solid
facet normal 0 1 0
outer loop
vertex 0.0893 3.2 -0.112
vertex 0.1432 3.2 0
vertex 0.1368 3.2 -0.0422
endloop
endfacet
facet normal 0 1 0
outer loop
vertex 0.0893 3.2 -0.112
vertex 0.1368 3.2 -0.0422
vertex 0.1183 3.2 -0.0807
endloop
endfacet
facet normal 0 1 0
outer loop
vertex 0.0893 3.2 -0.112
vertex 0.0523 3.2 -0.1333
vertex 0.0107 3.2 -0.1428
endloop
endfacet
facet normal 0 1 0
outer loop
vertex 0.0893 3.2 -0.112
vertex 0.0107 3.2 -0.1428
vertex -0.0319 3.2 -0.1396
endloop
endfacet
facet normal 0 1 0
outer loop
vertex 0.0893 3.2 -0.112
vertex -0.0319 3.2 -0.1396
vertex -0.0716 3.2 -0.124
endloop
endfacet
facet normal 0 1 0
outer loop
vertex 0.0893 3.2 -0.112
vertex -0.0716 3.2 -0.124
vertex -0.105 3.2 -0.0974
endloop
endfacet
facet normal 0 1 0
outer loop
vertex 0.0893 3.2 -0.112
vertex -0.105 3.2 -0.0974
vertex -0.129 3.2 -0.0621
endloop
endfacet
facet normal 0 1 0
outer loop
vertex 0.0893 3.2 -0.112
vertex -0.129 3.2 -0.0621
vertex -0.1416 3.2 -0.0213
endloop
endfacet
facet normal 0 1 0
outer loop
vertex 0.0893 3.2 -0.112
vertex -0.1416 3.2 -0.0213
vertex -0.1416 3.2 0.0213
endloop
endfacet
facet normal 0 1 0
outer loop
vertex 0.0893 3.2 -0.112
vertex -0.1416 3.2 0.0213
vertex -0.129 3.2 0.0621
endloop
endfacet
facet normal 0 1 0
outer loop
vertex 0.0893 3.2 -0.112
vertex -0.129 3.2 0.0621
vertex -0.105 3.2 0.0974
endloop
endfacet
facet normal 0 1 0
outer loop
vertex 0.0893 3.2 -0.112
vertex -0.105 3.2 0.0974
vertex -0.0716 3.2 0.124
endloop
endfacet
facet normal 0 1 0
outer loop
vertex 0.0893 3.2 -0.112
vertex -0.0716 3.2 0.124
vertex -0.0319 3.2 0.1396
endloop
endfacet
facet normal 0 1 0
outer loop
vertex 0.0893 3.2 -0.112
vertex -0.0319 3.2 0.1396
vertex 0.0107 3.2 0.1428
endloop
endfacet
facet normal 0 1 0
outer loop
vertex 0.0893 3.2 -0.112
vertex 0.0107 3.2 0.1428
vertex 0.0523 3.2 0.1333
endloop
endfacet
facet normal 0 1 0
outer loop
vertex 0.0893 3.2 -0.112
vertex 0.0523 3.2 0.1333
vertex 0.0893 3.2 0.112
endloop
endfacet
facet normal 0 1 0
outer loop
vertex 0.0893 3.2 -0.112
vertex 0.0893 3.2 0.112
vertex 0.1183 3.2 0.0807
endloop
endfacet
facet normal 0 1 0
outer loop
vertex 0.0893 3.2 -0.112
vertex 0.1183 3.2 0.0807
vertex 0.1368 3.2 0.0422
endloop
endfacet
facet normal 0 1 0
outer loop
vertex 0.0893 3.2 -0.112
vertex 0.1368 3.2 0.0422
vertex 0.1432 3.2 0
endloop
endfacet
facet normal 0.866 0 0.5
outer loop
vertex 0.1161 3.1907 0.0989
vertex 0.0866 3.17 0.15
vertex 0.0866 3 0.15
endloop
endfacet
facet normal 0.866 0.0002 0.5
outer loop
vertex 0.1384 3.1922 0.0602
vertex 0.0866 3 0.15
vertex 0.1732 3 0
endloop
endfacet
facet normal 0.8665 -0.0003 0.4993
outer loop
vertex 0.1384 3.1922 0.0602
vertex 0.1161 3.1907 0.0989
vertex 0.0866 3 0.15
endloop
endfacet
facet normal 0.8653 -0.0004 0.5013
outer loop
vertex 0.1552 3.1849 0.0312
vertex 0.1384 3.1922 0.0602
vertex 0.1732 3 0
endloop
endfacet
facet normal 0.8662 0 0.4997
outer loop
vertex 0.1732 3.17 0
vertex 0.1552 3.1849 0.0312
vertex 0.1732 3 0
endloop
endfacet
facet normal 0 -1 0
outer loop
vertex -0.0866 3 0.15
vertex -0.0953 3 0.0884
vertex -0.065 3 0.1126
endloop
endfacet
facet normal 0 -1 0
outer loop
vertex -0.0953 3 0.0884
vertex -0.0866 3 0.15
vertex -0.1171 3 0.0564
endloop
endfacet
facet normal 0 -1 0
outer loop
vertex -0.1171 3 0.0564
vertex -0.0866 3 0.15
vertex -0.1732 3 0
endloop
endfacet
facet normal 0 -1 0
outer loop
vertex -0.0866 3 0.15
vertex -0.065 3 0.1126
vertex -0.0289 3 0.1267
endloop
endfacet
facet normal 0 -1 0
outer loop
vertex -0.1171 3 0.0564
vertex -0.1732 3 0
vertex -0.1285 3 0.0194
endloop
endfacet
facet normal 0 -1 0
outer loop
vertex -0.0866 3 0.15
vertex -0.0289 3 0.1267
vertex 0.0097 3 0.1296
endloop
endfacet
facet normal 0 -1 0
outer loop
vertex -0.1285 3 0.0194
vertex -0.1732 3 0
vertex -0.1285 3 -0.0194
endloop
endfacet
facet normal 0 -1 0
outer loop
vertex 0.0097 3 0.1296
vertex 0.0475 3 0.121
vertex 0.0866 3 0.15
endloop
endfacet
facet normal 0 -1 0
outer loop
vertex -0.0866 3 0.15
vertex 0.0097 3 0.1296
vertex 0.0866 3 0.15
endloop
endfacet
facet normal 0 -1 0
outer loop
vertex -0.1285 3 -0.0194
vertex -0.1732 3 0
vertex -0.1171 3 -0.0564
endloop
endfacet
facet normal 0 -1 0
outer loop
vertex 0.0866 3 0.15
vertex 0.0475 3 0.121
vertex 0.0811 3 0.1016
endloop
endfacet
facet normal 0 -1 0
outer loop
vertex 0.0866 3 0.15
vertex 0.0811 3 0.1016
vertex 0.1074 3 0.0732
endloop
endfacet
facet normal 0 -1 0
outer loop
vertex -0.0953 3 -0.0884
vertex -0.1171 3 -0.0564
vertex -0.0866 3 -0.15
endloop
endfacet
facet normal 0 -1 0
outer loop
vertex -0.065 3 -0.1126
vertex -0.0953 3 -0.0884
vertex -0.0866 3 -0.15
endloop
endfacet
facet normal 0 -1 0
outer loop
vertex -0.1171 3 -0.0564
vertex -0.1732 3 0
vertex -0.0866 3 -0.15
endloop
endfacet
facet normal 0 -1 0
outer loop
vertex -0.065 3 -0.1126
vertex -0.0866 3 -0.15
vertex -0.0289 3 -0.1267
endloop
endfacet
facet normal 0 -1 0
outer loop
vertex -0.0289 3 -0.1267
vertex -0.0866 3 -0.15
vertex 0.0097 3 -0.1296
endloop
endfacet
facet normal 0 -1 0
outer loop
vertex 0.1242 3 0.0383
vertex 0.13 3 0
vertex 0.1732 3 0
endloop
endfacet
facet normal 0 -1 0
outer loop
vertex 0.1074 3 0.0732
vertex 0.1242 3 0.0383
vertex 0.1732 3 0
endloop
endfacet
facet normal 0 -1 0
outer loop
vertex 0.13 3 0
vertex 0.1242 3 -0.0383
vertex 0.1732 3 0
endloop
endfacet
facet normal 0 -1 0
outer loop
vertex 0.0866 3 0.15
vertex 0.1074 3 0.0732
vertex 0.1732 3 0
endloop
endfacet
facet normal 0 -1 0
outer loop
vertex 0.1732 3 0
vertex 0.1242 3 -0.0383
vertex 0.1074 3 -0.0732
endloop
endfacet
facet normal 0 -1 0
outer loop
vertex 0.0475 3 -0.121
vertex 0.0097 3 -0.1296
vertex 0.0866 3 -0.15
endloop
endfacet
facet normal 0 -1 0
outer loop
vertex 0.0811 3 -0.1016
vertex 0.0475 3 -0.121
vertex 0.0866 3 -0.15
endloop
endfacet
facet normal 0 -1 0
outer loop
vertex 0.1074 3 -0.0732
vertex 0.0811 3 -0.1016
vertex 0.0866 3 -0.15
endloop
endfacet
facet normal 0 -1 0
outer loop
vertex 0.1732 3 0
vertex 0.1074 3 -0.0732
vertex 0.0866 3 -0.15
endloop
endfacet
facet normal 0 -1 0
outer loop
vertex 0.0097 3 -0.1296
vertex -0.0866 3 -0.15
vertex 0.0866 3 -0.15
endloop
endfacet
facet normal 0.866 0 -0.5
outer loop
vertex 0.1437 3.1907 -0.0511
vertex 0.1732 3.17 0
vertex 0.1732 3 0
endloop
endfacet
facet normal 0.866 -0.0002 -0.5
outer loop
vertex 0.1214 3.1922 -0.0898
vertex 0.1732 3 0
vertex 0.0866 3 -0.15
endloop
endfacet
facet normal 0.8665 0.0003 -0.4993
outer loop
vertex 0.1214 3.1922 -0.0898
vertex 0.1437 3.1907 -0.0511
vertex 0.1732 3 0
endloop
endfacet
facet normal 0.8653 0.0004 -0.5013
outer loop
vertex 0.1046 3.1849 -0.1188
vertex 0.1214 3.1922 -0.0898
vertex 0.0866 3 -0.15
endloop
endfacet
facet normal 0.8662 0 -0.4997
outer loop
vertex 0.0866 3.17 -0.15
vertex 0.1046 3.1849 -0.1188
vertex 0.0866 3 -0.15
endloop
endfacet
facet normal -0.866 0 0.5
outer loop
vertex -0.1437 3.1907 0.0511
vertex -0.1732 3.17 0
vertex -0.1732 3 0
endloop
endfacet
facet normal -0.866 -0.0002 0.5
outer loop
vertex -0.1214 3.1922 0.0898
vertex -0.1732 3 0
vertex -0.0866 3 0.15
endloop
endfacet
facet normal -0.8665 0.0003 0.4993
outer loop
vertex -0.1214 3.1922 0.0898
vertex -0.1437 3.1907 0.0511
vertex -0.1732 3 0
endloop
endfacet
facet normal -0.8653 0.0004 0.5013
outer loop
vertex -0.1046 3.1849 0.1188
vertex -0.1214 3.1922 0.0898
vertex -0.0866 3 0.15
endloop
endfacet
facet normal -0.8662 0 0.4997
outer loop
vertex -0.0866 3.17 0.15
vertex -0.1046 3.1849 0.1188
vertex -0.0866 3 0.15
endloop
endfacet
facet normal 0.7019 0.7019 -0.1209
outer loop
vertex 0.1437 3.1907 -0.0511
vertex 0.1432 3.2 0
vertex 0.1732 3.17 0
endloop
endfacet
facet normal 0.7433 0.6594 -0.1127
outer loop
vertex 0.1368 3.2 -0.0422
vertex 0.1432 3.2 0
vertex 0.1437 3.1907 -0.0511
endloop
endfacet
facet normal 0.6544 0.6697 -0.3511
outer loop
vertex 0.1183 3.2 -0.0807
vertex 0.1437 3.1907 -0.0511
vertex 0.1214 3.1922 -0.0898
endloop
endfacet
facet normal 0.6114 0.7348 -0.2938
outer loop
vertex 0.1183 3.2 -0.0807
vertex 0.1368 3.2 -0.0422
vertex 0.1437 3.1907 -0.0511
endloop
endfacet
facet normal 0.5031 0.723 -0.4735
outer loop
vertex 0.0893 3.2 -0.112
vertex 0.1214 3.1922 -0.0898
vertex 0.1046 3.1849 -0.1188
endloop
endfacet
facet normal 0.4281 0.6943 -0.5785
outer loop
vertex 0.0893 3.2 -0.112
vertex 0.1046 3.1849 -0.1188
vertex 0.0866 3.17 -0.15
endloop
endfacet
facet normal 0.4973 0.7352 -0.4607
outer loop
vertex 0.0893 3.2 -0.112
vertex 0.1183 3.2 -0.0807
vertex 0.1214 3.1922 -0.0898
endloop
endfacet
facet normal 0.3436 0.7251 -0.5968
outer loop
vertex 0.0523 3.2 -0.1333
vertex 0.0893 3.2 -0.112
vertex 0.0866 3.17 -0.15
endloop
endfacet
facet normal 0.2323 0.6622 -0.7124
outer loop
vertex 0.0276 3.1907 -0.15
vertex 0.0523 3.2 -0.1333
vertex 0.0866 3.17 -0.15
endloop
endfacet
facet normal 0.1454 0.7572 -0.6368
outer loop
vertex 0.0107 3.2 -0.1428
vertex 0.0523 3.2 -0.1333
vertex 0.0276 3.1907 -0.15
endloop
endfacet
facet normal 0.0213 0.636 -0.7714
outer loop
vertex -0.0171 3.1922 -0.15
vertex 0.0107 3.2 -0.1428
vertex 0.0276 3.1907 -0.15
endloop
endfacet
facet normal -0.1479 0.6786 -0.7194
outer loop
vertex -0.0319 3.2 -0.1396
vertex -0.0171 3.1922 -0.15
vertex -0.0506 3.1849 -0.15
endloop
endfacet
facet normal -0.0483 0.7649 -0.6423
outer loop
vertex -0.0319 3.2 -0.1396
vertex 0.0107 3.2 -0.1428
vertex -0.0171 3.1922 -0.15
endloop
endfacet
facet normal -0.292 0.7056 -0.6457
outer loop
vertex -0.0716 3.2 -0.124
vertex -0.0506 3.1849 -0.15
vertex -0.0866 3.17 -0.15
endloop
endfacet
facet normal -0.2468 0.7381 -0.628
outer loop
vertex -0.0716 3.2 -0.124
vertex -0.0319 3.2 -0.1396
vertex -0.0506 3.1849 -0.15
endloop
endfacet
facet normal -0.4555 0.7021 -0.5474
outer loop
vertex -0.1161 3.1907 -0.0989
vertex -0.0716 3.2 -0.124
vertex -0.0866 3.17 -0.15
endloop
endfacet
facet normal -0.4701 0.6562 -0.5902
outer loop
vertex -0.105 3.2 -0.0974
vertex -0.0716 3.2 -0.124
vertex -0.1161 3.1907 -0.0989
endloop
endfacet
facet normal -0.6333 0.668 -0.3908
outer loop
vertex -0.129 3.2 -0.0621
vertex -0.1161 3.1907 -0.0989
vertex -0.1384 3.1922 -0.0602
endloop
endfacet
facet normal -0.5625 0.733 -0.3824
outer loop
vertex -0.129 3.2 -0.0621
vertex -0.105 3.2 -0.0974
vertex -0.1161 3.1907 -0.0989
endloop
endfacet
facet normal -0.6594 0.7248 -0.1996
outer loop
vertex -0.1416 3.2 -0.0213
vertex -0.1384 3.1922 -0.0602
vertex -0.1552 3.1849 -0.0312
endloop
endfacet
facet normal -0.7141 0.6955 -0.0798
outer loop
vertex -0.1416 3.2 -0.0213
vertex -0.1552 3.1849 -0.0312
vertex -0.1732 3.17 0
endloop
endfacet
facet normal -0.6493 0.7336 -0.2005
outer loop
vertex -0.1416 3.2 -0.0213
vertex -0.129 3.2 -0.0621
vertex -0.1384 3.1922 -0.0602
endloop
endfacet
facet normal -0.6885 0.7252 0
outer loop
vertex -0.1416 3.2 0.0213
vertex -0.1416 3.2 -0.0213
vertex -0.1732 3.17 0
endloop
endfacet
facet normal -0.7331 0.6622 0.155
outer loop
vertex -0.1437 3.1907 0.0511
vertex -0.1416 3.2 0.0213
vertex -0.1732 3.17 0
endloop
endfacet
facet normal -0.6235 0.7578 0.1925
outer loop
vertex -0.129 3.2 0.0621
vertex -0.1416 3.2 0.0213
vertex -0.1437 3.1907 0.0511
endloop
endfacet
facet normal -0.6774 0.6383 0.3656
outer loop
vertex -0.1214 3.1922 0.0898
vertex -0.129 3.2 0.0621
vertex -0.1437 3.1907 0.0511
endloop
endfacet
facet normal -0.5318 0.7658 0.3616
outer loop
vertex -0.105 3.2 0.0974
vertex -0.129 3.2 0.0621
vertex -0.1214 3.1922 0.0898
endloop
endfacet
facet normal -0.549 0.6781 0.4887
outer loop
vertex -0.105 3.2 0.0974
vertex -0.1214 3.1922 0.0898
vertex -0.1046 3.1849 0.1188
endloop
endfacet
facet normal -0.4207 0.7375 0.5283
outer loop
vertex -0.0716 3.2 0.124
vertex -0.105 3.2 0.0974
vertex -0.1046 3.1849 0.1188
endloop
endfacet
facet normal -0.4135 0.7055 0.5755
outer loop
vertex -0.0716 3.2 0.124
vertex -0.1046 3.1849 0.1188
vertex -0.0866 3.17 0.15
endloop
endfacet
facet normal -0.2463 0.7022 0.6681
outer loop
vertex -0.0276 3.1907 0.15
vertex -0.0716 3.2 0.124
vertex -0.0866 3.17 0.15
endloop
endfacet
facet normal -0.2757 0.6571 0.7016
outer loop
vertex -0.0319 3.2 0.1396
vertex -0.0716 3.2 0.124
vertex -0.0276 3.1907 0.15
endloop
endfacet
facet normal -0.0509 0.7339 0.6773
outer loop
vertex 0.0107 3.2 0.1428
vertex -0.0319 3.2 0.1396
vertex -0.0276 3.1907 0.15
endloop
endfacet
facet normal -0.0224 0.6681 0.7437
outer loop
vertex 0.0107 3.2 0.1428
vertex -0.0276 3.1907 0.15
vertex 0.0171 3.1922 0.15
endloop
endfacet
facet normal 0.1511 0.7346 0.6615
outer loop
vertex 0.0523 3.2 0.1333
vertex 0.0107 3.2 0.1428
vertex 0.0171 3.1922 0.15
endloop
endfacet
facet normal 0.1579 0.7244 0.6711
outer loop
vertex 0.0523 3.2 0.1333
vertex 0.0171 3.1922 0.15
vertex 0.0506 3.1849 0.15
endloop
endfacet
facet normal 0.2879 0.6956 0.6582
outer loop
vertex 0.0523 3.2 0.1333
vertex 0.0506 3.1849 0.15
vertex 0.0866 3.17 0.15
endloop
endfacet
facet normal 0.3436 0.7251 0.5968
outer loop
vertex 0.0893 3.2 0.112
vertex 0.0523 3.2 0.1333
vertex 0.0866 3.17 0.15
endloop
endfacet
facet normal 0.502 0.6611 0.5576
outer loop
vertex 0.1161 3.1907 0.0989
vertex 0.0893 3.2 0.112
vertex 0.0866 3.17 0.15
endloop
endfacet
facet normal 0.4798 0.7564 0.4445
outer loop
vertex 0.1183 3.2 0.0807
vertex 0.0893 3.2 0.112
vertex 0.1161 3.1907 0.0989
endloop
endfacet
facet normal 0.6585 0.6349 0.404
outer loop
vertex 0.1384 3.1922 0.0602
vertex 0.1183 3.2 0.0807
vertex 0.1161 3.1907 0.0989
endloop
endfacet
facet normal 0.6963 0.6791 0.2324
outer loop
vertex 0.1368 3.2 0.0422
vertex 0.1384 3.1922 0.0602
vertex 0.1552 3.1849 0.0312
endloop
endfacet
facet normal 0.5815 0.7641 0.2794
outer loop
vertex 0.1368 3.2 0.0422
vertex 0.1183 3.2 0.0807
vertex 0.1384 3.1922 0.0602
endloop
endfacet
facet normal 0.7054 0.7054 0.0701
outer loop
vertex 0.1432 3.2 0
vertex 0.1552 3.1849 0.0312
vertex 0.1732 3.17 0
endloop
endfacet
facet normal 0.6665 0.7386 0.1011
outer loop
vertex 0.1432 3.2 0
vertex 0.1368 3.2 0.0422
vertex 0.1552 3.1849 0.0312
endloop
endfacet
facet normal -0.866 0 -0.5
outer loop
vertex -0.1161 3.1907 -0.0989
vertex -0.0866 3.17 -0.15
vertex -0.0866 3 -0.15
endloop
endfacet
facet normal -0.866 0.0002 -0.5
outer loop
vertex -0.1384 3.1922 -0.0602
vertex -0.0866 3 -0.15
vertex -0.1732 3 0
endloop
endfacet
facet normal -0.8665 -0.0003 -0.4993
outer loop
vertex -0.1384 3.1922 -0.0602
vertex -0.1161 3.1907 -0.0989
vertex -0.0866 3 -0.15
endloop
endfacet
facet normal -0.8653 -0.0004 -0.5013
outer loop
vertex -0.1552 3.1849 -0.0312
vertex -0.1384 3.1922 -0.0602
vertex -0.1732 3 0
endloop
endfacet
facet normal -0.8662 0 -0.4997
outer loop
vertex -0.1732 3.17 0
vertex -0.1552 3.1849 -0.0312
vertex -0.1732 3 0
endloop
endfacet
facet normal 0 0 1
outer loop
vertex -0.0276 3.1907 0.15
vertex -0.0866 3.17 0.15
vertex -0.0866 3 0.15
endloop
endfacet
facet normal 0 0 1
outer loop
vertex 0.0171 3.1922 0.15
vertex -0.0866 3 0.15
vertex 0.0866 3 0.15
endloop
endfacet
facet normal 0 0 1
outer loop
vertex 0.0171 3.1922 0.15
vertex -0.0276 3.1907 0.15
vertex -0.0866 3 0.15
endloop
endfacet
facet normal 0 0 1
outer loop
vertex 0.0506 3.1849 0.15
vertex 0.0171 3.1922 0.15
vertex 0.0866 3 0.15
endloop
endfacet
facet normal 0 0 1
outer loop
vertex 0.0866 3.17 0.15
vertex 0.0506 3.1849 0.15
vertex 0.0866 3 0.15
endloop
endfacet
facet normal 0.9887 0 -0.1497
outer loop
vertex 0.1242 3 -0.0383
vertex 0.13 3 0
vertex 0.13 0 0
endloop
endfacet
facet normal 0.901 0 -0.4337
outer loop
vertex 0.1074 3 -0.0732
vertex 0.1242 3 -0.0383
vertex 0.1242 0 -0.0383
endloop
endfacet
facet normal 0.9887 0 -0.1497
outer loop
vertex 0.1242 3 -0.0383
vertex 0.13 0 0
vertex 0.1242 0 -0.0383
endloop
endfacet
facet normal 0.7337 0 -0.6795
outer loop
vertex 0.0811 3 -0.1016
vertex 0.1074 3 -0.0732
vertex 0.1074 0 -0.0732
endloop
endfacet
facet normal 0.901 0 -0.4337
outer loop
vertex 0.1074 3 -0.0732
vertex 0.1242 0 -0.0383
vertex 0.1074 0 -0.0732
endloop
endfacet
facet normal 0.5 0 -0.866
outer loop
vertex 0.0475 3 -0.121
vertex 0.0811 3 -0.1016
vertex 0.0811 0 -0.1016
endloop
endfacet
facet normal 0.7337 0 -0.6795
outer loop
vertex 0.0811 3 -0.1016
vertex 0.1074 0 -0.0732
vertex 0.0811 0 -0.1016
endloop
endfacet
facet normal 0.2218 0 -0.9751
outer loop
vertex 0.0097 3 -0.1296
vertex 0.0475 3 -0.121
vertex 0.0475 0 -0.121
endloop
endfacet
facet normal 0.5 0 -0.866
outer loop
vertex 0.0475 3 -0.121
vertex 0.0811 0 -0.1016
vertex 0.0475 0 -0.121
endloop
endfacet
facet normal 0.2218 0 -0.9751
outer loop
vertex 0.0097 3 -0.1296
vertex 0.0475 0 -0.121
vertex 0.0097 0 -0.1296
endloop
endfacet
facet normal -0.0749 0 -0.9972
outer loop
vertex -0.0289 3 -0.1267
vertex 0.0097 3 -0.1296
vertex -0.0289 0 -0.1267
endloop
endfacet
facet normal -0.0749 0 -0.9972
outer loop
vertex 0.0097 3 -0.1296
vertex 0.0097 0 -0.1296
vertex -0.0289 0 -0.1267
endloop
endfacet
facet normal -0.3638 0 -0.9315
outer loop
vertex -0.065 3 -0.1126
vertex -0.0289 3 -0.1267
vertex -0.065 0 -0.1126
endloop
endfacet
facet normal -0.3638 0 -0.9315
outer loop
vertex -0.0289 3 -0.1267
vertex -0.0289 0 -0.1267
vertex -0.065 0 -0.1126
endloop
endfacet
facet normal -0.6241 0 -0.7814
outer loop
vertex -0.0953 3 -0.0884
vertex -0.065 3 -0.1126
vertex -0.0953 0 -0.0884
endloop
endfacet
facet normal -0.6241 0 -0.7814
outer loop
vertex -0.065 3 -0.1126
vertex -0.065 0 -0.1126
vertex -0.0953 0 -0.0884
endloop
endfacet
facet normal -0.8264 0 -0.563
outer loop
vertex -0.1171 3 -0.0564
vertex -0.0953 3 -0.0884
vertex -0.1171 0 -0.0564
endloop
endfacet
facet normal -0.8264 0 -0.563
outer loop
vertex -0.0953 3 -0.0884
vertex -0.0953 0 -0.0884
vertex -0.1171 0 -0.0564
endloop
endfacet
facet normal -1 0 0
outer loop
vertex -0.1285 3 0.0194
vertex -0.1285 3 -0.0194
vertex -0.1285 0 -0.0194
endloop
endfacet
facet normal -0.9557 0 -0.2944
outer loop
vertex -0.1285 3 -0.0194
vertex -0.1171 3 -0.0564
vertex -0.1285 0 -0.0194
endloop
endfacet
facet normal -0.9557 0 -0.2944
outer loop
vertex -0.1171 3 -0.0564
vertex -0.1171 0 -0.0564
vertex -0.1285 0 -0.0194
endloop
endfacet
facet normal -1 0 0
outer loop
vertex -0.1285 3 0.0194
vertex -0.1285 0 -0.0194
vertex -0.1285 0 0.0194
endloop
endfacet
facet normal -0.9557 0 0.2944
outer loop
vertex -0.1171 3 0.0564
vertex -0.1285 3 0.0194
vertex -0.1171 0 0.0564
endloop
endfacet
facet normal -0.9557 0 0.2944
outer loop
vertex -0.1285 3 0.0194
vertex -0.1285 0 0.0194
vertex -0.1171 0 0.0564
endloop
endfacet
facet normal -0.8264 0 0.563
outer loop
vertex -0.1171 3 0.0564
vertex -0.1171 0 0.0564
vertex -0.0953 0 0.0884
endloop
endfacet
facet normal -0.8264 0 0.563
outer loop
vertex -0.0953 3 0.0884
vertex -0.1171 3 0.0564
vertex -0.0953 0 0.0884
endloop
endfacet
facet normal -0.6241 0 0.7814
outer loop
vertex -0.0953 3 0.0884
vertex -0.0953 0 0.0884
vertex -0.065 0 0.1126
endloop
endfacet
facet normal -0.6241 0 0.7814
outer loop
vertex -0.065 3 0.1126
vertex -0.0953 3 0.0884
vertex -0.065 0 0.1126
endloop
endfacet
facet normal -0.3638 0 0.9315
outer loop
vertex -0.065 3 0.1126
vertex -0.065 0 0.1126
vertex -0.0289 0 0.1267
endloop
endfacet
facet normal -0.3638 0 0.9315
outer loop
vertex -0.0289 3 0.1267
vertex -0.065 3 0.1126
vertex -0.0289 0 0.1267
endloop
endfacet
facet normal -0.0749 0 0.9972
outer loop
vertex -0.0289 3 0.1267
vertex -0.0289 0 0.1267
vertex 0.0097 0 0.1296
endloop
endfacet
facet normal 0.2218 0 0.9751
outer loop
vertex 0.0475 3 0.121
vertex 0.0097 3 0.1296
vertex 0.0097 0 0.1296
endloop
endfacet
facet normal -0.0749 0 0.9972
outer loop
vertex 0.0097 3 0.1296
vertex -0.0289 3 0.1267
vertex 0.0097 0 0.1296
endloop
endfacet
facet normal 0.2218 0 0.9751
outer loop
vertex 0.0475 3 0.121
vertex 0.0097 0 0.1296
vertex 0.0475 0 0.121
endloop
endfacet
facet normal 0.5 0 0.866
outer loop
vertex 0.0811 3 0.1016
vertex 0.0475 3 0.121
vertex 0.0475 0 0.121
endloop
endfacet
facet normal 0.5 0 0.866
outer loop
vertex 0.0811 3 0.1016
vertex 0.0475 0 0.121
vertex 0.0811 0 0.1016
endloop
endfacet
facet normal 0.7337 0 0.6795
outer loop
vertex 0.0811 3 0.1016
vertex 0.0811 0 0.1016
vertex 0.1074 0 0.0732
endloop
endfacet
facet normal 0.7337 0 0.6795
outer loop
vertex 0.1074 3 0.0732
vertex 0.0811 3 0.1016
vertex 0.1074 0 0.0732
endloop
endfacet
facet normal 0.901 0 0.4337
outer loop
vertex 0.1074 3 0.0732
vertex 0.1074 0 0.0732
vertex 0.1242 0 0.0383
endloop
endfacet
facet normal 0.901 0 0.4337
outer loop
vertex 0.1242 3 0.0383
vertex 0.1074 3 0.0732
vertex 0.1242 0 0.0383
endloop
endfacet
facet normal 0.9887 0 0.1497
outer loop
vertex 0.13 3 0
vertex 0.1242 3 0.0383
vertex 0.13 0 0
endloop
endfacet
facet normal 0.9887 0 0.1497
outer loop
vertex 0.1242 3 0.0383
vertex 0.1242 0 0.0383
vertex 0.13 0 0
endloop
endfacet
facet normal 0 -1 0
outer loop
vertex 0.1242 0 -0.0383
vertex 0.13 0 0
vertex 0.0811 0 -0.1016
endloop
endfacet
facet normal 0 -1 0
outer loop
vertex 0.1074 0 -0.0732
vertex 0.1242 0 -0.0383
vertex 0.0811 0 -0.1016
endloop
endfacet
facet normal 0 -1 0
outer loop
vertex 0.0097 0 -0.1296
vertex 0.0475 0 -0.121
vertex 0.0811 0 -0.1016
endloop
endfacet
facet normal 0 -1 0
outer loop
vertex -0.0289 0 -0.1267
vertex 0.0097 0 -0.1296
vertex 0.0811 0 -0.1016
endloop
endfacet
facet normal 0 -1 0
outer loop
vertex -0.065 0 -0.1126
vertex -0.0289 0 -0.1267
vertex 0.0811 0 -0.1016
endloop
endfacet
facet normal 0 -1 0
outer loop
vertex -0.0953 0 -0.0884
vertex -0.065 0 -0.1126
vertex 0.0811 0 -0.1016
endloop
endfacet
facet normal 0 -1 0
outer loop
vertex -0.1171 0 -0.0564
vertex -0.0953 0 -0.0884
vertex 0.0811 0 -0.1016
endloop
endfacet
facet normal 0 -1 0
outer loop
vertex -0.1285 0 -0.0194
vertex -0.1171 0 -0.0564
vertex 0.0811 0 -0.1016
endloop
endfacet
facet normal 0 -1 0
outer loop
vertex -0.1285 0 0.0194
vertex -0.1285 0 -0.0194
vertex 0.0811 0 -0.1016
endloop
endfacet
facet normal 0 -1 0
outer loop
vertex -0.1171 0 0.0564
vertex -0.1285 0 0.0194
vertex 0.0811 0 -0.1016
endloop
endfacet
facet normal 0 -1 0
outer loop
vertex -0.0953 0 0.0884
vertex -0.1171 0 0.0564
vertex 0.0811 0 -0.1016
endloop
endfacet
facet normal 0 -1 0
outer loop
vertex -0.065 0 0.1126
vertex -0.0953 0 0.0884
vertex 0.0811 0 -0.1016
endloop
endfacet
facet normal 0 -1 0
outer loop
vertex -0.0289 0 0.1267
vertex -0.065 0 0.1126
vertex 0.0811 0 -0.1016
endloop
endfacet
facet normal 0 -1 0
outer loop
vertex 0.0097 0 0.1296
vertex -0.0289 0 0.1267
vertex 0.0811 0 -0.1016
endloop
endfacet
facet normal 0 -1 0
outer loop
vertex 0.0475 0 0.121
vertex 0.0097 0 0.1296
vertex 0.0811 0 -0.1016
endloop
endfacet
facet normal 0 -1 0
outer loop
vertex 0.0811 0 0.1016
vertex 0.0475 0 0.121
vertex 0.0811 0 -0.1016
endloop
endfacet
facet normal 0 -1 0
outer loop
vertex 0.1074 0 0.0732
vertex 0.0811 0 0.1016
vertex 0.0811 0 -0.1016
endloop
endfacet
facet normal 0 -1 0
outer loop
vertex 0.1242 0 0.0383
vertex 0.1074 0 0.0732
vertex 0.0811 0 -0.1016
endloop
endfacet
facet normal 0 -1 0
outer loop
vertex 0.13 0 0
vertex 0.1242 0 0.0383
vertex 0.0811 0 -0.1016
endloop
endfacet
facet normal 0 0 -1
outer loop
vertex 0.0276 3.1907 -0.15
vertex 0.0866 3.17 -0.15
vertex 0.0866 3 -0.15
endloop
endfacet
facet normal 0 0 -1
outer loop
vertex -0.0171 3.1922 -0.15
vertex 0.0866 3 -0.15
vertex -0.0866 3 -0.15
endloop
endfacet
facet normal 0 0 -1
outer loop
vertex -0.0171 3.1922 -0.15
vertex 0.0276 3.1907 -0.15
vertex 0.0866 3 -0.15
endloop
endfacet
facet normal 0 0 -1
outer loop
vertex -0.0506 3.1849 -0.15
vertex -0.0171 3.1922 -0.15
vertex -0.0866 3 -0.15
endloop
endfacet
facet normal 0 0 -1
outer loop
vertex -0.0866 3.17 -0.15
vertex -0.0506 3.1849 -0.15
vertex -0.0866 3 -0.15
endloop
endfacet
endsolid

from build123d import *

# Parameters (mm, degrees)
SKETCH1_R           = 0.13
BOSS_EXTRUDE1_DEPTH = 3.2
BOSS_EXTRUDE2_DEPTH = 0.2


with BuildPart() as part:
    # Sketch1 → Boss-Extrude1 (new body)
    with BuildSketch(Plane(origin=(0, 0, 0), x_dir=(1, 0, 0), z_dir=(0, 1, 0))):
        Circle(SKETCH1_R)
    extrude(amount=BOSS_EXTRUDE1_DEPTH)

    # Sketch2 → Boss-Extrude2 (add)
    with BuildSketch(Plane(origin=(0, 3.2, 0), x_dir=(1, 0, 0), z_dir=(0, 1, 0))):
        Polygon((0.173205081, 0), (0.08660254, 0.15), (-0.08660254, 0.15), (-0.173205081, 0), (-0.08660254, -0.15), (0.08660254, -0.15), align=None)
    extrude(amount=-BOSS_EXTRUDE2_DEPTH)

    # Sketch3 → Cut-Revolve1 (revolve, cut)
    with BuildSketch(Plane.XY):
        Polygon((0.173205081, 3.2), (0.173205081, 3.17), (0.143205081, 3.2), align=None)
    revolve(axis=Axis((0, 0, 0), (0, 1, 0)), mode=Mode.SUBTRACT)


solid = part.part
